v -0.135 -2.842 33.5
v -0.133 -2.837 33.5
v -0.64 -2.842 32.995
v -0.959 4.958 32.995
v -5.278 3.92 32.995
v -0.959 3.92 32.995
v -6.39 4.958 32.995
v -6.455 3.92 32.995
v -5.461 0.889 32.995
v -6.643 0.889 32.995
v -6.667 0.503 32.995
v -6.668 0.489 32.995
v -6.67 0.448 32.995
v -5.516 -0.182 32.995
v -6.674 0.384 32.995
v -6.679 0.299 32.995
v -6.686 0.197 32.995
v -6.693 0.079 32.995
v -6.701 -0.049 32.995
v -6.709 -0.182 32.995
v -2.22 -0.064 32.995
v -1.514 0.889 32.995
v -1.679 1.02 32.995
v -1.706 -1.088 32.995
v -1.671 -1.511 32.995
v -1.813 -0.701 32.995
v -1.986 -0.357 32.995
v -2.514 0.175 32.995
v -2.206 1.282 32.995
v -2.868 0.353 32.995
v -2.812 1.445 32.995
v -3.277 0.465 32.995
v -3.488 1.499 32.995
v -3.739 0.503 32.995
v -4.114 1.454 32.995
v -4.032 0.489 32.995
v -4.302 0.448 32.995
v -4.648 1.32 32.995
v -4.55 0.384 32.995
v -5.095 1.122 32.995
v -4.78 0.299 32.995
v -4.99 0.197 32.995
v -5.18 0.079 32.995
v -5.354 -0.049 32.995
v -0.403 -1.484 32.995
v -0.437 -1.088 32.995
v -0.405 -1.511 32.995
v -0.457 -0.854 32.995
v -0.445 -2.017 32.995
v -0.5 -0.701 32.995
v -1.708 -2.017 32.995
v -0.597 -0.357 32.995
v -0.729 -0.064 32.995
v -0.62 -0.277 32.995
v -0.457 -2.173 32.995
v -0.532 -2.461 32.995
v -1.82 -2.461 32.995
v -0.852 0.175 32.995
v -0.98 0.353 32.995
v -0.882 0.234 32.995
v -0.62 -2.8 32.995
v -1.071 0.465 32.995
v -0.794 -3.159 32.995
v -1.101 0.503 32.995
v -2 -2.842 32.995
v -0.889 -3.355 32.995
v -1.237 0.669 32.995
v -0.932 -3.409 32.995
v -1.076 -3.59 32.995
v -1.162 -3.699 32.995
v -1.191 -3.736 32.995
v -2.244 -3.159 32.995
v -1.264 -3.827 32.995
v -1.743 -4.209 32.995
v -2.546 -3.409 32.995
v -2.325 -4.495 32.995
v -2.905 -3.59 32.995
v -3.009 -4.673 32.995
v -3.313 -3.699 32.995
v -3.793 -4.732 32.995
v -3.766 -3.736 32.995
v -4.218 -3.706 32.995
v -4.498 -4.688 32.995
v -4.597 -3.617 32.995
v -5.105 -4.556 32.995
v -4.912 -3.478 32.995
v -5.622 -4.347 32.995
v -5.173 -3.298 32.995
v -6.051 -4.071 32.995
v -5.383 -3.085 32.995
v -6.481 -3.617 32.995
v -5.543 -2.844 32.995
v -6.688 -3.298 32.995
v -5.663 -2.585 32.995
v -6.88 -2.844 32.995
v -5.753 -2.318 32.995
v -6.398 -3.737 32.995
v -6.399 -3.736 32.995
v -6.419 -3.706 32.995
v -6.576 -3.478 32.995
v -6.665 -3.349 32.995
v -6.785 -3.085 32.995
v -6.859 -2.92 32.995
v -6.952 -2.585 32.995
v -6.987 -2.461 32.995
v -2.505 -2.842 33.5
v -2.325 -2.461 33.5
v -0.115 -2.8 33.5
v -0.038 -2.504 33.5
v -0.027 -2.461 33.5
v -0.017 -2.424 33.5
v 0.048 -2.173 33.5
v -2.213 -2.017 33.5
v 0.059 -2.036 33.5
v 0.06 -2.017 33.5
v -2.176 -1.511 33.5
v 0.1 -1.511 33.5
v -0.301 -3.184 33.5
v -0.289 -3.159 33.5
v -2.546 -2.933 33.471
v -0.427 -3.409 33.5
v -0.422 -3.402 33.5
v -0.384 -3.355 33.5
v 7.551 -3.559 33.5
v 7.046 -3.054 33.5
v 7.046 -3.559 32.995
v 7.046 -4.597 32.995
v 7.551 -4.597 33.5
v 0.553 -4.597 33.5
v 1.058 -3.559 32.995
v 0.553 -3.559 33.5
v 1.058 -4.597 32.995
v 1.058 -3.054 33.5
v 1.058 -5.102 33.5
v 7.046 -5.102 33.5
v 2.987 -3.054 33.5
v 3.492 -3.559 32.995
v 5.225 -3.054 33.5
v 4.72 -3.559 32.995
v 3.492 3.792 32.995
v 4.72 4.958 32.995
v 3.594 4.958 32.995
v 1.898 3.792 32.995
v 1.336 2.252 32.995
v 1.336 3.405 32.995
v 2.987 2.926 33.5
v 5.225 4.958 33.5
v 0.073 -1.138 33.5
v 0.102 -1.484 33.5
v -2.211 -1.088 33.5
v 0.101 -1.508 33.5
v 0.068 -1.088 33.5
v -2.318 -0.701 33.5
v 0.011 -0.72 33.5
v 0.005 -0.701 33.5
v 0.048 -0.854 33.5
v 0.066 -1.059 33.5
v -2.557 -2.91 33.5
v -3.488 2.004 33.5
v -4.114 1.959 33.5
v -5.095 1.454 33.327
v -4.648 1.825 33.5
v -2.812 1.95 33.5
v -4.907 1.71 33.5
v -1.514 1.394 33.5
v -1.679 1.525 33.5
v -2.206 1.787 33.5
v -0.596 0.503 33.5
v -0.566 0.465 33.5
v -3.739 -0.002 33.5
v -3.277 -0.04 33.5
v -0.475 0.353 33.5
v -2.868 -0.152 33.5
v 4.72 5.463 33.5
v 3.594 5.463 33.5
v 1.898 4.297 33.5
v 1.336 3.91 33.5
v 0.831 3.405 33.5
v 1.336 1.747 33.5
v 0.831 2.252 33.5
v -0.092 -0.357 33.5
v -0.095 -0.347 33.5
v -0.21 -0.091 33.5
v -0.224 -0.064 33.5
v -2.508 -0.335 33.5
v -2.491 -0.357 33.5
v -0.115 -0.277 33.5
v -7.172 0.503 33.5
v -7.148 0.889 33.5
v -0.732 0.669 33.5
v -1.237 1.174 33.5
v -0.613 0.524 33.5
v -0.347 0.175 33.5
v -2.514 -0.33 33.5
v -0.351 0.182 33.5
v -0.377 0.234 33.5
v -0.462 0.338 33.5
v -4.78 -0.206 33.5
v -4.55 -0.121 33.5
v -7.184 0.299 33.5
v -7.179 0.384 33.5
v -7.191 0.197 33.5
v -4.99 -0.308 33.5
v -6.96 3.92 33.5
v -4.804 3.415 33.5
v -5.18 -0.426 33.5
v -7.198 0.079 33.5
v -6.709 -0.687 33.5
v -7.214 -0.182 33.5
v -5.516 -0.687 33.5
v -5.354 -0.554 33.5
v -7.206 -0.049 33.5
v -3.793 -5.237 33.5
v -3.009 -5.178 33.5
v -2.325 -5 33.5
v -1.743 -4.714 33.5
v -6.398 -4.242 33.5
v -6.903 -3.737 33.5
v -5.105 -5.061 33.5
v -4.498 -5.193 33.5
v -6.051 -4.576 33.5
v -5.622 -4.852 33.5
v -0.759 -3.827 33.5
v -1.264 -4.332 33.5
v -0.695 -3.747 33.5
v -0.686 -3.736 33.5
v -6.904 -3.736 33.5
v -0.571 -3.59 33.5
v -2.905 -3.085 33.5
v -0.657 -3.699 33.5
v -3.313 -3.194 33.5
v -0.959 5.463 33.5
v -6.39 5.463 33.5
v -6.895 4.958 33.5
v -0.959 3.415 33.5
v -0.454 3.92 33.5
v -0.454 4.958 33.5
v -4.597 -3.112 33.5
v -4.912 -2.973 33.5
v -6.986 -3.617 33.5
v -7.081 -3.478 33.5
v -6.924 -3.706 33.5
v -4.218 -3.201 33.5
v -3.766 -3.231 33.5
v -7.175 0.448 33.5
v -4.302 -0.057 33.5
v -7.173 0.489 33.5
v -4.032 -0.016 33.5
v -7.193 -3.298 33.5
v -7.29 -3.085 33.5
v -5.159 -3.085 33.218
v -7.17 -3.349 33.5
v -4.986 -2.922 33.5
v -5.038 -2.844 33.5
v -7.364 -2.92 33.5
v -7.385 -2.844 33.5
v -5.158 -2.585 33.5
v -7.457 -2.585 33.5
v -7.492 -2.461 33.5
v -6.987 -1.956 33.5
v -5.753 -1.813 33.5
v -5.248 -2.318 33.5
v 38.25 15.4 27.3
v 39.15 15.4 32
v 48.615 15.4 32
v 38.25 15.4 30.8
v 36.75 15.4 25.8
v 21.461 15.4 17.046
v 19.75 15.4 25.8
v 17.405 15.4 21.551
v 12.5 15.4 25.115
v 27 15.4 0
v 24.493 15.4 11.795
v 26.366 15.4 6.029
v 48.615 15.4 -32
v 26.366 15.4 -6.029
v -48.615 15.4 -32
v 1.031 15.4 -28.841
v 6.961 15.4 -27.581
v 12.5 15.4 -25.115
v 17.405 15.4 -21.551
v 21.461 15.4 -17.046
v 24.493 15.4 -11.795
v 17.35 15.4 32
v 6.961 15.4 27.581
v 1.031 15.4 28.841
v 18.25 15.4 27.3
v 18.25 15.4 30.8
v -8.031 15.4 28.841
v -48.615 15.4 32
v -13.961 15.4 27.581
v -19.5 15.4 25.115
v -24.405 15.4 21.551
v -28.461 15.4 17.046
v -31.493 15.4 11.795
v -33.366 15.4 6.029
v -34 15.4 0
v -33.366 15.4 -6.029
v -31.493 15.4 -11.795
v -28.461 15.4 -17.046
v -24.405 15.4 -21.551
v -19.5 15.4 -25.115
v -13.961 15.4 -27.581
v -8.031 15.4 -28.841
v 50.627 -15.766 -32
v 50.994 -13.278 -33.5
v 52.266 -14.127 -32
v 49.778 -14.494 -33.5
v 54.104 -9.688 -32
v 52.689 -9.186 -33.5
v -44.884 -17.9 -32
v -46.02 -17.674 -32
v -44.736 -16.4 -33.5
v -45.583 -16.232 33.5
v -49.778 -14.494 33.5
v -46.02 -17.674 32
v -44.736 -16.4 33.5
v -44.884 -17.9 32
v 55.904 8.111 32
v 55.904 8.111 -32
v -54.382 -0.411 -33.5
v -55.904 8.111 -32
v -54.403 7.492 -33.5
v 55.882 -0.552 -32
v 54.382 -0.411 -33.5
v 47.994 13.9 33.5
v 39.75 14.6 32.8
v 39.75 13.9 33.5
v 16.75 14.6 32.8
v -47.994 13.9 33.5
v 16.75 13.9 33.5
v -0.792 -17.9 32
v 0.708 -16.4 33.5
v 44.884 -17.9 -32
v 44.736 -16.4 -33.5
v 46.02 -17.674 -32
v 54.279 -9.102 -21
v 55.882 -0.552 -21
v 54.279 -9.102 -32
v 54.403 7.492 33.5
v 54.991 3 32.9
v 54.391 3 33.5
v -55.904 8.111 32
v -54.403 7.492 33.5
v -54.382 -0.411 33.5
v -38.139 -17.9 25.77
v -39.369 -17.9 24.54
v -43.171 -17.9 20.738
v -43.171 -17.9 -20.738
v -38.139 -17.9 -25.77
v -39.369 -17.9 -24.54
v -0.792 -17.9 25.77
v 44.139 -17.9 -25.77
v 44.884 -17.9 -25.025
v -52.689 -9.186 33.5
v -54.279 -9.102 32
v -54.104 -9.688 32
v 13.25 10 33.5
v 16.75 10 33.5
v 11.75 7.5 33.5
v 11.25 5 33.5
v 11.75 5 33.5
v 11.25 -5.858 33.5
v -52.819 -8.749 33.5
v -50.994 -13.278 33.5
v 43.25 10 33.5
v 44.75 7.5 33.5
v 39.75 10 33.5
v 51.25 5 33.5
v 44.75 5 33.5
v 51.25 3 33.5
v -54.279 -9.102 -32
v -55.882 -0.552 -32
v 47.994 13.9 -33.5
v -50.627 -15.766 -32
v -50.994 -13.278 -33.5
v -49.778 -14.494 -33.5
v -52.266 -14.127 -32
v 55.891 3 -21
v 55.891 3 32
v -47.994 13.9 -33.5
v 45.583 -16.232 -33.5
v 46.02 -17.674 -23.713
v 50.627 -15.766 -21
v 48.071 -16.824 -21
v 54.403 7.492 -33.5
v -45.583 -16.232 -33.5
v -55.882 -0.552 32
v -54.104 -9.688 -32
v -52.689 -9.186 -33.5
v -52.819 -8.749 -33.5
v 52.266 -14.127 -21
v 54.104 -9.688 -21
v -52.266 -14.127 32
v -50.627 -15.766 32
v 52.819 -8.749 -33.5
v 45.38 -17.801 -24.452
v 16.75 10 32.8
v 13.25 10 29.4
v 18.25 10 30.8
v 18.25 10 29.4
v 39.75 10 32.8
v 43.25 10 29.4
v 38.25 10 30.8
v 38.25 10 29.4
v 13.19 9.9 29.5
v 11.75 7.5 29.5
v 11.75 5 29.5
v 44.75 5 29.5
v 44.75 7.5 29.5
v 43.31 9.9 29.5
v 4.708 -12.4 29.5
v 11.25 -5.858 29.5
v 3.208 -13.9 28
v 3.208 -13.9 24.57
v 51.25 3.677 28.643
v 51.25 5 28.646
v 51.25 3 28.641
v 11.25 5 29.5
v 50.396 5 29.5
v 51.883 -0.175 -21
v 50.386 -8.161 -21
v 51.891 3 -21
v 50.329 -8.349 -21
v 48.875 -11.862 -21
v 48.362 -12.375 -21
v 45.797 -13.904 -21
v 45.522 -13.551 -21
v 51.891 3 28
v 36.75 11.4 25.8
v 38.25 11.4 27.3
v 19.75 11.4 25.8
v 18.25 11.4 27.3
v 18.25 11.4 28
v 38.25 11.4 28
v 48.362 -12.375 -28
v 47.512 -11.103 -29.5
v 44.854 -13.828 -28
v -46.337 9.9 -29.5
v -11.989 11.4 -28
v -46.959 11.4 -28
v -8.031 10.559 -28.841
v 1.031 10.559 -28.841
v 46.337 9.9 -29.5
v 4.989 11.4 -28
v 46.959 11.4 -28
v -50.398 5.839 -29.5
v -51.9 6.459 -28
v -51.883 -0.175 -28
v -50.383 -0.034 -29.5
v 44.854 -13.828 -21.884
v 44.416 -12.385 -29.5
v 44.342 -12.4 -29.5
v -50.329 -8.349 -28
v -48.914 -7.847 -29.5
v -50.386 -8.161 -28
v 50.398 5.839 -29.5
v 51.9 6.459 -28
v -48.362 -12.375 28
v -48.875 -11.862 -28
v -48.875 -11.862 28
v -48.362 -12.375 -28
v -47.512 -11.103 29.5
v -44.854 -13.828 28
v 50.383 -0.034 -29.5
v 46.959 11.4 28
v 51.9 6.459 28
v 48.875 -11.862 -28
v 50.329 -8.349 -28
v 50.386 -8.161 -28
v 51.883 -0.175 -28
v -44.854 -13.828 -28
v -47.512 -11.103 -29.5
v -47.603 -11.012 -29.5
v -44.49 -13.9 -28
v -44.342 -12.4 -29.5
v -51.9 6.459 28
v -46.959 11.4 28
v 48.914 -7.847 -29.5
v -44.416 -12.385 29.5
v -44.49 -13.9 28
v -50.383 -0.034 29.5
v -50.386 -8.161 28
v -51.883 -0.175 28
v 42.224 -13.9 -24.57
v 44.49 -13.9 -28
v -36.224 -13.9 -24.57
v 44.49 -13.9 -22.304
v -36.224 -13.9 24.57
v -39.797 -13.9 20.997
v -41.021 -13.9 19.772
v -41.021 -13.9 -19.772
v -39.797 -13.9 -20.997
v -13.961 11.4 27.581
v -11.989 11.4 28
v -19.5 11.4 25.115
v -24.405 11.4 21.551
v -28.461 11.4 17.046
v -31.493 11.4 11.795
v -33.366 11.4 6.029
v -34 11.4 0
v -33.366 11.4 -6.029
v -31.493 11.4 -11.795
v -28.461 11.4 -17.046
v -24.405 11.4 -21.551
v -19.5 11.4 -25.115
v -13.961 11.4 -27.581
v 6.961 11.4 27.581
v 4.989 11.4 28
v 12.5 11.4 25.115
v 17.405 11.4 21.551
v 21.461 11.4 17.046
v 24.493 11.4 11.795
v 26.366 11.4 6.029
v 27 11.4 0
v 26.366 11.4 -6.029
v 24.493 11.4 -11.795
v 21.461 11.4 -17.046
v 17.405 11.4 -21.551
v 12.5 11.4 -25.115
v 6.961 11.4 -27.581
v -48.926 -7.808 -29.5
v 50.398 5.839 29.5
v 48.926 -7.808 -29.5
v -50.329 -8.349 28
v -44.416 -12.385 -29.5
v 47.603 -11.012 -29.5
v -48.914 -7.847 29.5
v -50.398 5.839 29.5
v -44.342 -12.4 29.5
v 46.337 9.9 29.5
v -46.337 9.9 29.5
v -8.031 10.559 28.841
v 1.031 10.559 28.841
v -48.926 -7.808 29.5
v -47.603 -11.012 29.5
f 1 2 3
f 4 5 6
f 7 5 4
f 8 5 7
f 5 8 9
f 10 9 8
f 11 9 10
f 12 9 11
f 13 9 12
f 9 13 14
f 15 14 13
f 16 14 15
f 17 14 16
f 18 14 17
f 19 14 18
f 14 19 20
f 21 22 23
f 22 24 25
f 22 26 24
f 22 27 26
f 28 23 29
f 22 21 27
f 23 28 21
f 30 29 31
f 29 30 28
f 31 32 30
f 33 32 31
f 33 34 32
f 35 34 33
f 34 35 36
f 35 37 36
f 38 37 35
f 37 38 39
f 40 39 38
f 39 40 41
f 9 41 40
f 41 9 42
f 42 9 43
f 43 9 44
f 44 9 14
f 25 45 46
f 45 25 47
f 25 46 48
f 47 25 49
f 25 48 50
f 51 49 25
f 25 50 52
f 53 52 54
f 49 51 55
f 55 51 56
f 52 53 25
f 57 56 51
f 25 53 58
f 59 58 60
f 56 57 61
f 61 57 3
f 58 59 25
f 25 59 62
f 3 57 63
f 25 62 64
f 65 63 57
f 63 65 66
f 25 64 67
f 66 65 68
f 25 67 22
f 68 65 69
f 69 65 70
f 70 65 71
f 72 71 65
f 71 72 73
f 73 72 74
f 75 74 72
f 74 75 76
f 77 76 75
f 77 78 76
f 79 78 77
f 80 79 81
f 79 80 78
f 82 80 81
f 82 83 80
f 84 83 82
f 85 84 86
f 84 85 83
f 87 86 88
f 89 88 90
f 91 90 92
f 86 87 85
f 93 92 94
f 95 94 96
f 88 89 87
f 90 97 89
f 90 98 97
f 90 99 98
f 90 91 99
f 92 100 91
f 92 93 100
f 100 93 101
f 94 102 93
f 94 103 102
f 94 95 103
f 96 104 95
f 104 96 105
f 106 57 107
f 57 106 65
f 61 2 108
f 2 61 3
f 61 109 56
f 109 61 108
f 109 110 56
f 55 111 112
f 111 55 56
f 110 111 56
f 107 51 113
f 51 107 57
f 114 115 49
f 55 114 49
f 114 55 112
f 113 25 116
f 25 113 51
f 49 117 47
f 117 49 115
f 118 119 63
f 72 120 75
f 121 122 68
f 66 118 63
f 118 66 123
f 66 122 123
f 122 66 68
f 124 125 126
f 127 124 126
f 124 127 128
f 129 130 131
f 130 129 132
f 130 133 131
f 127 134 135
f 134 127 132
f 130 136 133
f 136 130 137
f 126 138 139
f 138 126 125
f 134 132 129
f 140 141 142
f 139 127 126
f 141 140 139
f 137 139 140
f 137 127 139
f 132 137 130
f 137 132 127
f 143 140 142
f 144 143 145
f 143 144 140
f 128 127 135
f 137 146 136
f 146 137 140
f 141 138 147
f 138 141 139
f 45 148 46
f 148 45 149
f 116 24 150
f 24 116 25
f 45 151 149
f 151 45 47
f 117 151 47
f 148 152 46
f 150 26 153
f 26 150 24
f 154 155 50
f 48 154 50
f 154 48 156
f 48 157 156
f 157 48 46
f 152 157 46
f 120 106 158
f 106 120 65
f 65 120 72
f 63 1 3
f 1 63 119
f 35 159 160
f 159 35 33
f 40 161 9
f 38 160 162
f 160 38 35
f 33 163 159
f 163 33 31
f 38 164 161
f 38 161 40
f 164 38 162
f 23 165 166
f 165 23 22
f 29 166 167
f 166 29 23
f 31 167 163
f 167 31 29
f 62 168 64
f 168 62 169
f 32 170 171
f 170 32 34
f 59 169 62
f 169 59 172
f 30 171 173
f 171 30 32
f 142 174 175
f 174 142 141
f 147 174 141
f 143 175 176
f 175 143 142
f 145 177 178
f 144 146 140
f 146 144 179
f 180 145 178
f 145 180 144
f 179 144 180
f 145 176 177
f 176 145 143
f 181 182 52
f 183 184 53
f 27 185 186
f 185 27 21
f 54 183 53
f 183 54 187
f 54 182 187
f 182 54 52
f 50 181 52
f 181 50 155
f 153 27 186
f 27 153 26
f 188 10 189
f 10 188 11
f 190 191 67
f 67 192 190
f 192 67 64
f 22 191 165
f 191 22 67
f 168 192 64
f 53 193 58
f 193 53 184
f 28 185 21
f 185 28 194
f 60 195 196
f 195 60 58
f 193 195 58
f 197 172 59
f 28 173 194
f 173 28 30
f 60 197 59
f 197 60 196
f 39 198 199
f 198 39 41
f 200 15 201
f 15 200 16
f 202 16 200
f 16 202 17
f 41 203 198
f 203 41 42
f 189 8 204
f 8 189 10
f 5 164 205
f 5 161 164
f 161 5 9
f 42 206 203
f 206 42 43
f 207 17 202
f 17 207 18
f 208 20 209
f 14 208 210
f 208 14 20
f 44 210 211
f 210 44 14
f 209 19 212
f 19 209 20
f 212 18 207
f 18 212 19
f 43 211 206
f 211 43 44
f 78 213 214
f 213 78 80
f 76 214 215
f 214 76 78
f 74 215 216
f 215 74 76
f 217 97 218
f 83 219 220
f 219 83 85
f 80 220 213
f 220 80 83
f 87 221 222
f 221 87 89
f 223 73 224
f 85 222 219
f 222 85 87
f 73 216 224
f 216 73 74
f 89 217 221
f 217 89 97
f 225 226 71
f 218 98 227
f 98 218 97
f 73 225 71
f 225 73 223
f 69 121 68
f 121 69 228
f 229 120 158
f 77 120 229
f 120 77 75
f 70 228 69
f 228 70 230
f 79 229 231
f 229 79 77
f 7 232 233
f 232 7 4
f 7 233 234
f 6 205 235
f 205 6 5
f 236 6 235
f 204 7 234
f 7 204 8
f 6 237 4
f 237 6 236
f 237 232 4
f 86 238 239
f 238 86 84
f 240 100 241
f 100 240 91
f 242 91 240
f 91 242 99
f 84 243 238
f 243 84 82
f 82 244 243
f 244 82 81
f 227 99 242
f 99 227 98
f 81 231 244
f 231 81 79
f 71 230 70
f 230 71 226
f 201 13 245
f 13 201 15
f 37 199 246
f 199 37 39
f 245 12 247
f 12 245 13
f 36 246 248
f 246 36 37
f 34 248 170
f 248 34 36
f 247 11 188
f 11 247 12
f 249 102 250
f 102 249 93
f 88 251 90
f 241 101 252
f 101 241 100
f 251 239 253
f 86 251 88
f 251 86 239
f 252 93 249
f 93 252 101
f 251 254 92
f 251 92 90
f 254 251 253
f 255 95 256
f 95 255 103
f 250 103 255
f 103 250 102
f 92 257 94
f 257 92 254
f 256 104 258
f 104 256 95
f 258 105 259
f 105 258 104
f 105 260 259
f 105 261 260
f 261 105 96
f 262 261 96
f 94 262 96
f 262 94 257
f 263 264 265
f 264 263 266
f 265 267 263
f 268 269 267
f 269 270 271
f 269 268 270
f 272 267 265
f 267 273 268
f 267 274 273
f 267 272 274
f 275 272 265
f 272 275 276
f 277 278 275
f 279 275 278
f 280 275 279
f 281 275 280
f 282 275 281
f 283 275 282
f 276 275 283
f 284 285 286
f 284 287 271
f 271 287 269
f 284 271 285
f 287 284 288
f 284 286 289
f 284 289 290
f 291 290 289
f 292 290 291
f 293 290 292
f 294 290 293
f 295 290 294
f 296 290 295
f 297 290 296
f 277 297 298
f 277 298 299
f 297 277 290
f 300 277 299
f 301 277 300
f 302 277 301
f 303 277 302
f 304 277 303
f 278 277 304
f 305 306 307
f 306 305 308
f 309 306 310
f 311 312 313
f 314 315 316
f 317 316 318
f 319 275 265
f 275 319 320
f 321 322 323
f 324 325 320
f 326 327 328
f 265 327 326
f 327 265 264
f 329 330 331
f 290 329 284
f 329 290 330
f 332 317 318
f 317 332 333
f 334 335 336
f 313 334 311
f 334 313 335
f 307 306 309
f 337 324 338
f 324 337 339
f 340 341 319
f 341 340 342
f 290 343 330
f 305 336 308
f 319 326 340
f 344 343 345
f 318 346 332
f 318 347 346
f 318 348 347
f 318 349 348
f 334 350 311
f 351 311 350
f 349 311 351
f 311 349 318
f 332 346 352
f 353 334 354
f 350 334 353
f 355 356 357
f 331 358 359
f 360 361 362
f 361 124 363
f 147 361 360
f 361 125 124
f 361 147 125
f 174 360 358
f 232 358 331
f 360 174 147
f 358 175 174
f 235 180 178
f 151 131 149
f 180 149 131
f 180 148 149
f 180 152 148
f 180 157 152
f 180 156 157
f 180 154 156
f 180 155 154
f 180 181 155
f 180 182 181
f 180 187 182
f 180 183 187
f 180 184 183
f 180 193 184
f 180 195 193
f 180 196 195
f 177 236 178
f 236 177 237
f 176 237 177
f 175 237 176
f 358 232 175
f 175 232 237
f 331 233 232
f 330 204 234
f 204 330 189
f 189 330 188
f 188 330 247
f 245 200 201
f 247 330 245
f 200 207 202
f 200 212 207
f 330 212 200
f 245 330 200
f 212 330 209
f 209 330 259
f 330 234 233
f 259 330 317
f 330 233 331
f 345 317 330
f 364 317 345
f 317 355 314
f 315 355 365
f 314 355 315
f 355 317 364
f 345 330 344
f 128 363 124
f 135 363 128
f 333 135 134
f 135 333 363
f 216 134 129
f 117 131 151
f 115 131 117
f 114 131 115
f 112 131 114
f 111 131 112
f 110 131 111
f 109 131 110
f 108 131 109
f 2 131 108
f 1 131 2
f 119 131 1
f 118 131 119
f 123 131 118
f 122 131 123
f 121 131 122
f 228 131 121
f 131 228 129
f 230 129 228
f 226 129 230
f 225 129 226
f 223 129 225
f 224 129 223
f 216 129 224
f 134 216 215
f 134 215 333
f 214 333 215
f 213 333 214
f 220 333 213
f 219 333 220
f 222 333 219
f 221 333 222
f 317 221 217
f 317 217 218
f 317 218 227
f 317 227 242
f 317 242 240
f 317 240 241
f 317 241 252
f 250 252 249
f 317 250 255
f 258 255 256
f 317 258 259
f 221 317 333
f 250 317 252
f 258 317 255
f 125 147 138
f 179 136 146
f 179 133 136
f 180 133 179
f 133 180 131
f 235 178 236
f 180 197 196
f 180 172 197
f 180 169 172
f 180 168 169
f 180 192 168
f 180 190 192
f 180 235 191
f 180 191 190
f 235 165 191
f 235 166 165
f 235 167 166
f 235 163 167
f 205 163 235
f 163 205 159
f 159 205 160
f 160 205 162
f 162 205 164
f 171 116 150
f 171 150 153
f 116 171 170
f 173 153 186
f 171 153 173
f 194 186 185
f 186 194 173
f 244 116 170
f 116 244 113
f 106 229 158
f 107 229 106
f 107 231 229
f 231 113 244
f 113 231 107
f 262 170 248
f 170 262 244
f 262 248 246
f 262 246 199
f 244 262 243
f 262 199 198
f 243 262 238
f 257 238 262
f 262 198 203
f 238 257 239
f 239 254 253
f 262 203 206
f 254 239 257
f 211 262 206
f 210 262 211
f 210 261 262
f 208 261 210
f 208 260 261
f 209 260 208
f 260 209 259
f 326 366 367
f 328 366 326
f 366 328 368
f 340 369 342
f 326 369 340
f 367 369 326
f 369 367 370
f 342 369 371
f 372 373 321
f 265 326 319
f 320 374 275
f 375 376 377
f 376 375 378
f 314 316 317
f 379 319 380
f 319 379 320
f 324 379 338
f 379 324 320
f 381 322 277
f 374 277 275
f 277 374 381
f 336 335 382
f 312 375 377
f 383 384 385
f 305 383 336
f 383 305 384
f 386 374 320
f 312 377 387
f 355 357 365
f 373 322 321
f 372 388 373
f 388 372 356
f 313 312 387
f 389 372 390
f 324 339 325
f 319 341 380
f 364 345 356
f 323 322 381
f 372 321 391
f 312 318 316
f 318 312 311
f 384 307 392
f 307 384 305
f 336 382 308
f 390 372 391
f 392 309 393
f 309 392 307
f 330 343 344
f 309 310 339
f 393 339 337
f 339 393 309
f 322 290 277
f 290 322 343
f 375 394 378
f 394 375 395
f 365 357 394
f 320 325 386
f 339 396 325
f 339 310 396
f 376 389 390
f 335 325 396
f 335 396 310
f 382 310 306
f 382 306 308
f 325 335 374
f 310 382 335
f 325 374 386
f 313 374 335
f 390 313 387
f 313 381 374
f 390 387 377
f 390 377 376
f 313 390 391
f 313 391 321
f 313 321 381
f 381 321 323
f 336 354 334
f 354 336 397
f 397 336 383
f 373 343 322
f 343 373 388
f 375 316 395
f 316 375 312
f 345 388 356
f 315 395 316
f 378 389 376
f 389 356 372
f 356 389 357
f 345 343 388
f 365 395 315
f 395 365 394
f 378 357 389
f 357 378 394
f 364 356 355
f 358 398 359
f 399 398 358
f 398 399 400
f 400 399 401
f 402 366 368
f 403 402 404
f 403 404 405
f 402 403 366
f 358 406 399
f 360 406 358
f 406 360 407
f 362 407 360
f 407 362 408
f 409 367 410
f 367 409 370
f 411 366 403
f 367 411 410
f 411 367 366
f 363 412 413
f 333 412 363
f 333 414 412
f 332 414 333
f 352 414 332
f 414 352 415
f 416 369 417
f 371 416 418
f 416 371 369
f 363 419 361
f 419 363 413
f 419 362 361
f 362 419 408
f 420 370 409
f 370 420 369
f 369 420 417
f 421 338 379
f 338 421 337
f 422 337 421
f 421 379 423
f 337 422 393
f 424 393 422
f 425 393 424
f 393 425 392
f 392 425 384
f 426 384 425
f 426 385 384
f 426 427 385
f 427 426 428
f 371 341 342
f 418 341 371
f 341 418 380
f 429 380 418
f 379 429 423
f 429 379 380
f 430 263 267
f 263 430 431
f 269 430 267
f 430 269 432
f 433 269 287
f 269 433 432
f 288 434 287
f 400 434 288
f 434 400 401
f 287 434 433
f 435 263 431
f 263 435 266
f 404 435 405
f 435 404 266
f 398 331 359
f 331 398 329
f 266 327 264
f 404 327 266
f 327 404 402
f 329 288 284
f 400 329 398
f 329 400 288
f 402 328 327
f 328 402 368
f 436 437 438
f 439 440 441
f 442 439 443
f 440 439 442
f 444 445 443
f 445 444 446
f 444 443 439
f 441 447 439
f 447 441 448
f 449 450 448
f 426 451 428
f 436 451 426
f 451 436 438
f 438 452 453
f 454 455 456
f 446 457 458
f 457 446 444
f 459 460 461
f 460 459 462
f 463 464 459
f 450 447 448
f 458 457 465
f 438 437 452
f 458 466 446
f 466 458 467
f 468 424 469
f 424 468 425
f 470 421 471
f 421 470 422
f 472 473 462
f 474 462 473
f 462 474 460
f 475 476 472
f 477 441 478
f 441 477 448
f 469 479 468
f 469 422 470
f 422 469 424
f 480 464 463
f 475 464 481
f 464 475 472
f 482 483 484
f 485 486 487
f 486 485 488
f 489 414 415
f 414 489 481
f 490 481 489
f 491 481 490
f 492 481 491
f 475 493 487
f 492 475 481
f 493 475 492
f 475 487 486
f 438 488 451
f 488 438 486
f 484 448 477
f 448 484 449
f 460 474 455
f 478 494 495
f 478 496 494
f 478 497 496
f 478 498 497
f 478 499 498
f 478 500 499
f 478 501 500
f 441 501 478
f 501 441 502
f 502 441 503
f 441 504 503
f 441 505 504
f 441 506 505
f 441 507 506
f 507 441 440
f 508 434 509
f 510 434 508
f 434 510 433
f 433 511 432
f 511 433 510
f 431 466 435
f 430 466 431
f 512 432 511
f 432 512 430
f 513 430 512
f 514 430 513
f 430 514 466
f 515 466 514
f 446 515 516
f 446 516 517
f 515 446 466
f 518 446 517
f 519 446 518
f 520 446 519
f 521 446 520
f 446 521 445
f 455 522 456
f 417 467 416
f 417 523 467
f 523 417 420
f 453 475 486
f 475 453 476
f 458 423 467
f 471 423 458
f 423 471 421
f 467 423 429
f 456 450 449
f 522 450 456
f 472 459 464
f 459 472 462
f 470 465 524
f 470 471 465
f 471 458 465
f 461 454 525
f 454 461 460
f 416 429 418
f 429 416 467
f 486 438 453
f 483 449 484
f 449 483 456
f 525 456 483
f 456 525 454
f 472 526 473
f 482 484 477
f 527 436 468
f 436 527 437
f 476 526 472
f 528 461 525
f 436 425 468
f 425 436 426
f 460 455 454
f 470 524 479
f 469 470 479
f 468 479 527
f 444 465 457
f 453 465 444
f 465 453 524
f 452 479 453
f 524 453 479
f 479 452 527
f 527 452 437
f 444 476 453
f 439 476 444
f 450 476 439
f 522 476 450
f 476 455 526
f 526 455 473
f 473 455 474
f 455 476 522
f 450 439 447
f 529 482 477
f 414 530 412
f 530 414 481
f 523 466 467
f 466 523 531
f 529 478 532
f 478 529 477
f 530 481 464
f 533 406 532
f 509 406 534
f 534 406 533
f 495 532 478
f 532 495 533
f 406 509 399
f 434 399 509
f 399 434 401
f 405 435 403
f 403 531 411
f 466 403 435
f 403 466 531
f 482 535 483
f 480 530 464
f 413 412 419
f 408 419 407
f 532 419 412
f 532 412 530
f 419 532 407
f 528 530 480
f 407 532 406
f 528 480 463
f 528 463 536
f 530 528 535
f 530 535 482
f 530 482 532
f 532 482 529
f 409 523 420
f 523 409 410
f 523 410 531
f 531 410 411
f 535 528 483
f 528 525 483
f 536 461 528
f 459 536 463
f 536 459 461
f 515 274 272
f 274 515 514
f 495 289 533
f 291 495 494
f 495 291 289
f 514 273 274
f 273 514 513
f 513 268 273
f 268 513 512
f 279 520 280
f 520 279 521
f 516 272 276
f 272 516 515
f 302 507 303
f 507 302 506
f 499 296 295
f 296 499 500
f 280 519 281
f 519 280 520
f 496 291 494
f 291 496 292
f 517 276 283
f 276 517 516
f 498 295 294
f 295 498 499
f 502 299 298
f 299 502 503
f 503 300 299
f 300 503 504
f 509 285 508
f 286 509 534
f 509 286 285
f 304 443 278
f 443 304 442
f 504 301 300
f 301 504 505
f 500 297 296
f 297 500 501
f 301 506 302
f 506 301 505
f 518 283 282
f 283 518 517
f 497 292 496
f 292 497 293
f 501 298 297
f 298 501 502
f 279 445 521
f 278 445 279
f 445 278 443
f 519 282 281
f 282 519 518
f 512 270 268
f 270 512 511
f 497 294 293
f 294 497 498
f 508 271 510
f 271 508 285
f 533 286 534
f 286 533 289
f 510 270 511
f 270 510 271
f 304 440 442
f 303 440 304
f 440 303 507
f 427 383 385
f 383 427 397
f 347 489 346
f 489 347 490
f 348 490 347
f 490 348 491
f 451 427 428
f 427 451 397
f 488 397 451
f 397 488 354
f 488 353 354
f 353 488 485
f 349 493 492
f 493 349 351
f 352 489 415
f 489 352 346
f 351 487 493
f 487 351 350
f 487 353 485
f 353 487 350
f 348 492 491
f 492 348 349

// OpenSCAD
// file: polyround2019.scad
//p=mirrorPolyline([[-1,-4,11,4],[-10,0,14,4],[-12,20,20,4],[-20,50,40,4],[-20,80,40,4],[-20,110,30,4],[-10,100,0,4],[-10,0,0,5],[-20,5,5,4],[-20,5,16,2],[-10,4,12,4] ]);

//polyline(p);
// 
//
// color ("yellow")polyline (polyRound(let(ip=([for (i=[0:3])[rnd(0,30),rnd(0,100),rnd(0,30),2+rnd(2)] ]))
//     mirrorPolyline([for(i=[0:0.5:len(ip)-1]) i==floor(i)?ip[i]: ip[i]+
//     [
// floor(rnd(2))==0? 0:max(0,rnd(10,20)*sign(rnd(-1,1))),
// floor(rnd(6))==0? 0:rnd(10,20)*sign(rnd(-1,1)),
// floor(rnd(2))==0? 0.01:rnd(10,20)*sign(rnd(-1,1)),
// 0(0,30),2+rnd(2)] ]))
//     mirrorPolyline([for(i=[0:0.5:len(ip)-1]) i==floor(i)?ip[i]: ip[i]+
//     [
// floor(rnd(2))==0? 0:max(0,rnd(10,20)*sign(rnd(-1,1))),
// floor(rnd(6))==0? 0:rnd(10,20)*sign(rnd(-1,1)),
// floor(rnd(2))==0? 0.01:rnd(10,20)*sign(rnd(-1,1)),
// 0
// ]  ])) ,2.5);
// ]  ])) ,1.5);
// 
// color ("darkgrey")polyline (polyRound(let(ip=([for (i=[0:2])[rnd(0,30),rnd(0,100),rnd


function polyRound(radiipoints,fn=5)=
// reworte most of it all here heavily use of wrap function
let(p=getpoints(radiipoints)) 
let(r=getradii(radiipoints))
let(Lp1=last(p),Lp=Lp1+1) 
let(
temp=[for(i=[0:last(p)]) 
round3points(
[ p[wrap(i-1,Lp,0)], p[wrap(i  ,Lp,0)], p[wrap(i+1,Lp,0)]],
r[i],
fn)])   //common trick  to flatten a list of list
[for (a = temp )        for (b = a) b];






 
 


function round3points(v,r,fn=6)=let(
p0=v[0],p1=v[1],p2=v[2],
n01=un(p0-p1),
n21=un(p2-p1),
planeNormal=un(cross(n21,n01)),
 

midLineNormal=un(n01 +n21),
 
angle=angle(n21,n01),
tanD=r /sin(angle/2),
 
center=p1+  midLineNormal*( tanD)
 

)
concat(
 [ for(i=[-.5:1/fn:.5])
    
center+ rotateAxis(   -midLineNormal*r ,planeNormal,(-i)*angle +180*i )    
] );

 
function angle (a,b)=atan2(sqrt((cross(a,b)*cross(a,b))),(a* b));
function dot(v1,v2) = v1[0]* v2[0]+ v1[1]* v2[1]+ v1[2]* v2[2];
function dot4(v1,v2) = v1[0]* v2[0]+ v1[1]* v2[1]+ v1[2]* v2[2]+ v1[3]* v2[3];

function point2plane(p,o,n) =
let (v = o - p) p + (n * (v.x * n.x + v.y * n.y + v.z * n.z)); //proj ap to a plane
function dist_point2plane(p,o,n) =
let (v = p-o) ( (v.x * n.x + v.y * n.y + v.z * n.z)); //proj ap to a plane
function mirrorPolyline(v)= [each v, each rev([for (i=v)[-i.x,i.y,i.z,i[3]]])] ;

function v3(p) = [p.x,p.y,p.z]; // vec3 formatter
function rev(v) = [for (i = [len(v) - 1: -1: 0]) v[i]];
function avrg(l) = len(l) > 1 ? addl(l) / (len(l)) : l;
function avrgp(l) = len(l) > 1 ? addlp(l) / (len(l)) : l;
function addlp(v,i=0,r=[0,0,0]) = i<len(v) ? addlp(v,i+1,r+v[i]) : r;
function lerp(start,end,bias) = (end * bias + start * (1 - bias));
function un(v)=assert (is_list(v)) v/max(norm(v),1e-64) ;
function rndc(a = 1,b = 0,s = [])=[rnd(a,b,s),rnd(a,b,s),rnd(a,b,s)];
function rnd(a = 1,b = 0,s = []) =
s == []?(rands(min(a,b),max(a,b),1)[0]) :(rands(min(a,b),max(a,b),1,s)[0]);
function getpoints(p)=[for(i=p)[i.x,i.y,i.z]];// gets [x,y]list of[x,y,r]list
function getradii(p)= [for(i=p)is_num(i[3])? i[3]: 0 ]; // gets [r]list of[x,y,r]list
function wrap(x,x_max=1,x_min=0) = (((x - x_min) % (x_max - x_min)) + (x_max - x_min)) % (x_max - x_min) + x_min; // wraps numbers inside boundaries
function last(i)=len(i)-1;// shorthand sugar for len(i)-1

module polyline(p,r=1) {for(i=[0:max(0,len(p)-2)])line(p[i],p[wrap(i+1,len(p) )],r);}

module polyline_open(p,r=1) {
     if (len(p)-1>1)
     for(i=[0:max(0,len(p)-2)])line(p[i],p[   i+1],r);
} // polyline plotter

module line(p1,p2 ,width=1) 
{ // single line plotter
hull() {
translate(v3(p1)) sphere(width);
translate(v3(p2)) sphere(width);
}
}

module 3dcircle(r,n)
{
axis=cross([0,0,1],n);
theta=angle ([0,0,1],n);
rotate (theta,axis) circle(r);
}


 function rotateAxis(point,axis,angle)=RotateQuat(BuildQuat(axis,angle), point);

function  /*vec4*/  NormQuat(/*vec4*/q)=
 let(     lenSQ =  dot4(q, q),     invLenSQ = 1./lenSQ)     q*invLenSQ;
 

function /*vec4*/ BuildQuat(/*vec3*/  axis,   angle)= 
     NormQuat(concat(axis *sin(angle*0.5),[ cos(angle*0.5)]));


 function /*vec3*/RotateQuat(/*vec4*/q, /*vec3*/v)=
let(    /*vec3*/ t = 2.*cross([q.x,q.y,q.z], v)     )    v + q[3]*t + cross([q.x,q.y,q.z], t);




//
// function /*vec4*/MulQuat(/*vec4*/q1, /*vec4*/q2)=
//{
//    /*vec4*/res = vec4(0.);
//    res.w   = q1.w*q2.w - dot(q1.xyz, q2.xyz);
//    res.xyz = q1.w*q2.xyz + q2.w*q1.xyz + cross(q1.xyz, q2.xyz);
//     NormQuat(res);
//}
//
// 
//    
//
//
function fromTo(/*vec3*/p,/*vec3*/q)=
 
 acos(dot(p,q));

 
// function /*vec4*/quatLookAt(/*vec3*/forward,/*vec3*/up){
//    forward=normalize(forward);
//    up=normalize(up);
//  (BuildQuat(cross(forward,up),fromTo(forward,up)));
//}
//
//
// function /*vec4*/quatInv(in /*vec4*/q)=
//{
//     vec4(-q.xyz, q.w);
//}
// main file
    include<polyround2019.scad>
    nr="51";
cage=false;
//cage=true;
c1=17.5/2+1;
c2=4+1;
c3=59;
hc3=58/2;
l1=102/2-c1;
l2=102/2-c2*1.5+1;
l3=(24-c1*2)+c2-1.5;
fxtra=0;
shell=4;
wl1=l1+c1*1;
wl3=l3+c2/2+1;
wl3f=l3+c2/2+1+fxtra;
whc3=hc3+1.5;
r=4;
r2=10;

slit =false;
     path=  polyRound( [
     [ wl1-10,wl3f,whc3,3],
    [ wl1,wl3f,whc3,3], 
   [ wl1,wl3f,-whc3,r],  [wl1,-wl3,-whc3,r2], [-wl1,-wl3,-whc3,r2],
     [-wl1,wl3f,-whc3,r],[-wl1,wl3f,whc3,r],  
      [-wl1,-wl3,whc3,r2], 
     [ wl1-47,-wl3,whc3,r2], 
     [ wl1-47,wl3f,whc3,3], 
//     [ wl1-35,wl3f,whc3,3],   
//     [ wl1-35,wl3f,whc3-10,3],   
      
    ]
  ,fn=4);
  
  
       path2=   ( [
       [0, 0, 30], [0, 20, 30], 
       [21.2132, 20, 21.2132]       ,[21.2132, 0, 21.2132]       ,
       [30, 0, 0],    [30, 20, 0], 
       [21.2132, 20, -21.2132],        [21.2132, 0, -21.2132], 
       [0, 0, -30],   [0, 20, -30],
       [-21.2132, 20, -21.2132],  [-21.2132, 0, -21.2132], 
       [-30, 0, 0],[-30, 20, 0],
       [-21.2132, 20, 21.2132],        [-21.2132, 0, 21.2132], 
      [0, 00, 30], 
       
       ]*1.03
       
   );
//       echo(path2);
//*difference(){
//    union(){
//translate([0,-29,0])    rotate([0,90/4+0,0]) translate([0,l2 ,0])    polyline(path2,4);
//translate([0,10.5,0])rotate([-90,0,0])cylinder(8,hc3+6,hc3+6);
//    }
//translate([0,0,0])rotate([-90,0,0])cylinder(60,hc3,hc3);
//
//}+965
rotate(360*$t)
 color("white")render()
rotate([0,0,0])difference(){
union(){
difference(){

    //main boudy
 hull(){
  linear_extrudeSH(c3+shell*2, $convexity=100,center=true) offset(delta=shell,$fn=1)topprofile();
//  translate([0,fxtra,0])  linear_extrudeSH(c3+shell*2, $convexity=100,center=true) offset(shell,$fn=1)topprofile();
    }
    
    
    minkowski(){
    translate([0,0,hc3+shell])linear_extrude(0.01,center=true)    text(nr,$fn=4,halign="center",valign="center");
 
     cylinder(shell,0,shell,$fn=4);
     }
    
    
    
  
 translate([l1-18+5,-10,hc3+shell-2])hull(){
   // top notch1
       cube([30,40,shell*3.6-3+3],center=true);
    translate([0,0,0])// top notch1
       cube([33,35,shell*3.6-3+3],center=true);
    translate([0,0,0])// top notch1
       cube([30,40,shell*3.6-3+19],center=true);}
    
   translate([l1-25,-15,hc3+shell]) rotate([0,0,45]) cube([40,20,80],center=true);// chamfer
    translate([l1-10,-15,hc3+shell]) rotate([0,0,0]) cube([40,40,26],center=true);// chamfer
   translate([l1-10,-15,hc3+shell]) rotate([0,0,0]) cube([40,40,26],center=true);// chamfer
  translate([l1+10,-8,hc3+shell+-10]) rotate([0,0,0]) cube([25,22,88],center=true);// chamfer
  * translate([l1+10,22, -10]) rotate([0,0,0]) cube([50,40,1],center=true);// chamfer
    translate([l1+5,-8,hc3+shell]) rotate([0,0,0]) cylinder(10,10,10,center=true);// chamfer
}
        
//translate([0,0,0])hull()
//{
//        linear_extrudeSH(c3+shell*2, $convexity=100,center=true) offset(shell)topprofile();
//
// translate([-20,0,0])rotate([-90,0,0])cylinder(21,hc3+2.5,hc3+2.5);
//translate([20,0,0])rotate([-90,0,0])cylinder(21,hc3+2.5,hc3+2.5);
//     translate([-20,0,0])rotate([-90,0,0])cylinder(22,hc3+1,hc3+1);
//translate([20,0,0])rotate([-90,0,0])cylinder(22,hc3+1,hc3+1);
//}
if(cage)translate([0,-c2+2 ,0 ])polyline(path,4.1);
}


   translate([l1-13 ,0,hc3+shell])// top notch
hull(){
    cube([20-3,40-3,shell*3.6],center=true);
   cube([20,40,shell*3.6-3],center=true);
}   
translate([l1-13 ,0,hc3+shell+shell*1.25])// top notch
 hull(){
    cube([23-3,43-4,shell*3.6],center=true);
   cube([23,43,shell*3.6-4],center=true);
}

 //innner void   
linear_extrudeSH(c3, $convexity=100,center=true) topprofile();
*translate([0,0,-hc3])linear_extrudeSH(shell*34, $convexity=100,center=true) offset(7)offset(-10)scale([.5,1])topprofile();


if(slit)translate([-90,-.5,-hc3+1])linear_extrudeSH(2, $convexity=100 ) topprofile();// slit
//mirror([0,0,1])translate([-90,-4,-hc3+1])linear_extrudeSH(2, $convexity=100 ) topprofile();

 
//union( convexity=100){
//linear_extrude(2, $convexity=100) offset(3)  topprofile();
//translate([0,0,c3*2+3])linear_extrude(2, $convexity=20) offset(3)  topprofile();
//linear_extrude(c3*2+4, convexity=100)
//
//difference()
//{
// offset(2)   topprofile();
//    topprofile();
//}
//}

    
    
translate([0,0,0])hull()
{
 translate([-5,0,0])rotate([-90,0,0])cylinder(25,hc3,hc3);
translate([-2,0,0])rotate([-90,0,0])cylinder(25,hc3,hc3);
}

 // screen port
translate([3,-16,0]) difference(){
 rotate([90,0,0])  linear_extrude(8,center=true,convexity=10,scale=1.1) 
    offset(delta=shell*2,chamfer=true) offset(-shell*2)square([86,48],center=true);// display
//  translate([-0,-0,29])     cube([100,15,2.5],center=true);// display
// translate([-0,-0,-29])     cube([100,15,2.5],center=true);// display

}


//translate([l1-8,-10,hc3+shell])// top notch
//hull(){
//    cube([42-3,40-3,shell*3.6],center=true);
//   cube([42,40,shell*3.6-3],center=true);
//}
 *translate([l1,-15,hc3+shell])  cube([40,40,40],center=true);
 *translate([l1,-15,-10])  cube([40,30,8],center=true);
 *translate([l1,-13,-10]) rotate([45,0,0]) cube([40,11,11],center=true);
 *if(!cage) translate([l1-35,-13,hc3]) rotate([0,0,45]) cube([40,10,10],center=true);
 *if(!cage) translate([l1+c1,-2,hc3]) rotate([0,0,45]) cube([40,10,36],center=true);
 *translate([l1,-3-20,hc3+shell-20]) rotate([-45,0,0]) cube([40,20,40],center=true);// chamfer


}
function clamp(v,a=0,b=1)=min(max(v,min(a,b)),max(1,b));


module topprofile(){
    offset(-.1,$fn=1)hull(){
     offset(1,$fn=1)
hull(){
translate([l1,0])  circle(c1,$fn=8);
translate([-l1,0])  circle(c1,$fn=8);
 

translate([c2*.25*0,-l3])
 {
translate([l2,0])  circle(c2,$fn=8);
translate([-l2,0])  circle(c2,$fn=8);
}




} 
translate([0,c2+1.5]) 
 {
translate([l2+c2/2,0])  circle(c2,$fn=4);
translate([-l2-c2/2,0])  circle(c2,$fn=4);
}
}
}

module linear_extrudeSH(h,convexity=100,center )
{
    sh=1.5;
    hull(){
    linear_extrude(h-2*sh, $convexity=convexity,center=center) children();
    linear_extrude(h , $convexity=convexity,center=center) offset(r=-1*sh  )children();

    }
    }
